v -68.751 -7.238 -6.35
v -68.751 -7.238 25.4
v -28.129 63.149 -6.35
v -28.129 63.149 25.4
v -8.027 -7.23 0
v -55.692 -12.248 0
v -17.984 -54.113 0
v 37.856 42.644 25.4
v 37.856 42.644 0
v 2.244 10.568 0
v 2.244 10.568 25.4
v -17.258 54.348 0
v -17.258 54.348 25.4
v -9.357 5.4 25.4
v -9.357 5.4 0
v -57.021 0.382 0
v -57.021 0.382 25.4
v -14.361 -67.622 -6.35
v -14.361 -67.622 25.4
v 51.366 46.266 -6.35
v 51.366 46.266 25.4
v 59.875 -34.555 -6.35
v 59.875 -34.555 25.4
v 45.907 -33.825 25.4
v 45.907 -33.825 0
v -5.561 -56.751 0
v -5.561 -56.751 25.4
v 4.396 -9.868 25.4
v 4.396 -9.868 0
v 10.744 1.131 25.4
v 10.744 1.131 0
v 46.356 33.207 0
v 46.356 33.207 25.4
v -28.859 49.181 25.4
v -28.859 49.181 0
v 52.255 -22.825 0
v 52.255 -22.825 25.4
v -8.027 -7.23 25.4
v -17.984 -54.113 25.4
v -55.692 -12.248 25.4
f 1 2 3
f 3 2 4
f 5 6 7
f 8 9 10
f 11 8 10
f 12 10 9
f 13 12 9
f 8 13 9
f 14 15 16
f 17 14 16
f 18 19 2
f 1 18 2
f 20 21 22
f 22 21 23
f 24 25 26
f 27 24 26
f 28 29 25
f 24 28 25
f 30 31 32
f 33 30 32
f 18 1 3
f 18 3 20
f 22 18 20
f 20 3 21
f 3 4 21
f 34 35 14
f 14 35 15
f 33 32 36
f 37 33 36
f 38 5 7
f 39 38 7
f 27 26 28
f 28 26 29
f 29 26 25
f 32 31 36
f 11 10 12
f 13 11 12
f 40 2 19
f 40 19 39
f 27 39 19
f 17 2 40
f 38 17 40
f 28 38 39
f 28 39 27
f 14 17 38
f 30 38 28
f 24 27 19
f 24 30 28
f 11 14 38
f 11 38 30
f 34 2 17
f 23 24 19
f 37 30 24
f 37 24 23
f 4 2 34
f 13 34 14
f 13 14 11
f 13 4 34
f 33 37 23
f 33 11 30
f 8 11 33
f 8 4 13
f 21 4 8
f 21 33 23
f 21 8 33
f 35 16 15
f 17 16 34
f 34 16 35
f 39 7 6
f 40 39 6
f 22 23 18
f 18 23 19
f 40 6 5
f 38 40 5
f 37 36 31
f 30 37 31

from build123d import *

# Parameters (mm, degrees)
F1_DEPTH = 25.4
F2_DEPTH = 25.4
F4_DEPTH = 6.35


with BuildPart() as f1:
    # F0 (on Top) → F1 (new body)
    with BuildSketch(Plane.XY):
        Polygon((0, 0), (-14.361076, -67.622363), (59.874873, -34.554655), align=None)
        Polygon((4.395829, -9.868497), (45.906835, -33.825098), (-5.560647, -56.750806), align=None, mode=Mode.SUBTRACT)
        Polygon((0, 0), (-68.750506, -7.238264), (-14.361076, -67.622363), align=None)
        Polygon((-17.983588, -54.112525), (-55.691559, -12.248475), (-8.027112, -7.230215), align=None, mode=Mode.SUBTRACT)
        Polygon((51.365783, 46.266412), (-28.129073, 63.14887), (0, 0), align=None)
        Polygon((-17.257516, 54.34844), (37.855945, 42.643901), (2.244256, 10.567585), align=None, mode=Mode.SUBTRACT)
        Polygon((51.365783, 46.266412), (0, 0), (59.874873, -34.554655), align=None)
        Polygon((46.355573, 33.207464), (52.25489, -22.825453), (10.743884, 1.131149), align=None, mode=Mode.SUBTRACT)
    extrude(amount=F1_DEPTH)

    # F0 (on Top) → F2 (join)
    with BuildSketch(Plane.XY):
        Polygon((0, 0), (-68.750506, -7.238264), (-14.361076, -67.622363), align=None)
        Polygon((-17.983588, -54.112525), (-55.691559, -12.248475), (-8.027112, -7.230215), align=None, mode=Mode.SUBTRACT)
        Polygon((-28.129073, 63.14887), (-68.750506, -7.238264), (0, 0), align=None)
        Polygon((-57.021304, 0.381718), (-28.85863, 49.180833), (-9.356857, 5.399978), align=None, mode=Mode.SUBTRACT)
        Polygon((51.365783, 46.266412), (-28.129073, 63.14887), (0, 0), align=None)
        Polygon((-17.257516, 54.34844), (37.855945, 42.643901), (2.244256, 10.567585), align=None, mode=Mode.SUBTRACT)
        Polygon((0, 0), (-14.361076, -67.622363), (59.874873, -34.554655), align=None)
        Polygon((4.395829, -9.868497), (45.906835, -33.825098), (-5.560647, -56.750806), align=None, mode=Mode.SUBTRACT)
        Polygon((51.365783, 46.266412), (0, 0), (59.874873, -34.554655), align=None)
        Polygon((46.355573, 33.207464), (52.25489, -22.825453), (10.743884, 1.131149), align=None, mode=Mode.SUBTRACT)
    extrude(amount=F2_DEPTH)

    # F3 (on face) → F4 (join)
    with BuildSketch(Plane(origin=(0, 0, 0), x_dir=(1, 0, 0), z_dir=(0, 0, -1))):
        Polygon((-68.750506, 7.238264), (-28.129073, -63.14887), (51.365783, -46.266412), (59.874873, 34.554655), (-14.361076, 67.622363), align=None)
    extrude(amount=F4_DEPTH)


solid = f1.part
